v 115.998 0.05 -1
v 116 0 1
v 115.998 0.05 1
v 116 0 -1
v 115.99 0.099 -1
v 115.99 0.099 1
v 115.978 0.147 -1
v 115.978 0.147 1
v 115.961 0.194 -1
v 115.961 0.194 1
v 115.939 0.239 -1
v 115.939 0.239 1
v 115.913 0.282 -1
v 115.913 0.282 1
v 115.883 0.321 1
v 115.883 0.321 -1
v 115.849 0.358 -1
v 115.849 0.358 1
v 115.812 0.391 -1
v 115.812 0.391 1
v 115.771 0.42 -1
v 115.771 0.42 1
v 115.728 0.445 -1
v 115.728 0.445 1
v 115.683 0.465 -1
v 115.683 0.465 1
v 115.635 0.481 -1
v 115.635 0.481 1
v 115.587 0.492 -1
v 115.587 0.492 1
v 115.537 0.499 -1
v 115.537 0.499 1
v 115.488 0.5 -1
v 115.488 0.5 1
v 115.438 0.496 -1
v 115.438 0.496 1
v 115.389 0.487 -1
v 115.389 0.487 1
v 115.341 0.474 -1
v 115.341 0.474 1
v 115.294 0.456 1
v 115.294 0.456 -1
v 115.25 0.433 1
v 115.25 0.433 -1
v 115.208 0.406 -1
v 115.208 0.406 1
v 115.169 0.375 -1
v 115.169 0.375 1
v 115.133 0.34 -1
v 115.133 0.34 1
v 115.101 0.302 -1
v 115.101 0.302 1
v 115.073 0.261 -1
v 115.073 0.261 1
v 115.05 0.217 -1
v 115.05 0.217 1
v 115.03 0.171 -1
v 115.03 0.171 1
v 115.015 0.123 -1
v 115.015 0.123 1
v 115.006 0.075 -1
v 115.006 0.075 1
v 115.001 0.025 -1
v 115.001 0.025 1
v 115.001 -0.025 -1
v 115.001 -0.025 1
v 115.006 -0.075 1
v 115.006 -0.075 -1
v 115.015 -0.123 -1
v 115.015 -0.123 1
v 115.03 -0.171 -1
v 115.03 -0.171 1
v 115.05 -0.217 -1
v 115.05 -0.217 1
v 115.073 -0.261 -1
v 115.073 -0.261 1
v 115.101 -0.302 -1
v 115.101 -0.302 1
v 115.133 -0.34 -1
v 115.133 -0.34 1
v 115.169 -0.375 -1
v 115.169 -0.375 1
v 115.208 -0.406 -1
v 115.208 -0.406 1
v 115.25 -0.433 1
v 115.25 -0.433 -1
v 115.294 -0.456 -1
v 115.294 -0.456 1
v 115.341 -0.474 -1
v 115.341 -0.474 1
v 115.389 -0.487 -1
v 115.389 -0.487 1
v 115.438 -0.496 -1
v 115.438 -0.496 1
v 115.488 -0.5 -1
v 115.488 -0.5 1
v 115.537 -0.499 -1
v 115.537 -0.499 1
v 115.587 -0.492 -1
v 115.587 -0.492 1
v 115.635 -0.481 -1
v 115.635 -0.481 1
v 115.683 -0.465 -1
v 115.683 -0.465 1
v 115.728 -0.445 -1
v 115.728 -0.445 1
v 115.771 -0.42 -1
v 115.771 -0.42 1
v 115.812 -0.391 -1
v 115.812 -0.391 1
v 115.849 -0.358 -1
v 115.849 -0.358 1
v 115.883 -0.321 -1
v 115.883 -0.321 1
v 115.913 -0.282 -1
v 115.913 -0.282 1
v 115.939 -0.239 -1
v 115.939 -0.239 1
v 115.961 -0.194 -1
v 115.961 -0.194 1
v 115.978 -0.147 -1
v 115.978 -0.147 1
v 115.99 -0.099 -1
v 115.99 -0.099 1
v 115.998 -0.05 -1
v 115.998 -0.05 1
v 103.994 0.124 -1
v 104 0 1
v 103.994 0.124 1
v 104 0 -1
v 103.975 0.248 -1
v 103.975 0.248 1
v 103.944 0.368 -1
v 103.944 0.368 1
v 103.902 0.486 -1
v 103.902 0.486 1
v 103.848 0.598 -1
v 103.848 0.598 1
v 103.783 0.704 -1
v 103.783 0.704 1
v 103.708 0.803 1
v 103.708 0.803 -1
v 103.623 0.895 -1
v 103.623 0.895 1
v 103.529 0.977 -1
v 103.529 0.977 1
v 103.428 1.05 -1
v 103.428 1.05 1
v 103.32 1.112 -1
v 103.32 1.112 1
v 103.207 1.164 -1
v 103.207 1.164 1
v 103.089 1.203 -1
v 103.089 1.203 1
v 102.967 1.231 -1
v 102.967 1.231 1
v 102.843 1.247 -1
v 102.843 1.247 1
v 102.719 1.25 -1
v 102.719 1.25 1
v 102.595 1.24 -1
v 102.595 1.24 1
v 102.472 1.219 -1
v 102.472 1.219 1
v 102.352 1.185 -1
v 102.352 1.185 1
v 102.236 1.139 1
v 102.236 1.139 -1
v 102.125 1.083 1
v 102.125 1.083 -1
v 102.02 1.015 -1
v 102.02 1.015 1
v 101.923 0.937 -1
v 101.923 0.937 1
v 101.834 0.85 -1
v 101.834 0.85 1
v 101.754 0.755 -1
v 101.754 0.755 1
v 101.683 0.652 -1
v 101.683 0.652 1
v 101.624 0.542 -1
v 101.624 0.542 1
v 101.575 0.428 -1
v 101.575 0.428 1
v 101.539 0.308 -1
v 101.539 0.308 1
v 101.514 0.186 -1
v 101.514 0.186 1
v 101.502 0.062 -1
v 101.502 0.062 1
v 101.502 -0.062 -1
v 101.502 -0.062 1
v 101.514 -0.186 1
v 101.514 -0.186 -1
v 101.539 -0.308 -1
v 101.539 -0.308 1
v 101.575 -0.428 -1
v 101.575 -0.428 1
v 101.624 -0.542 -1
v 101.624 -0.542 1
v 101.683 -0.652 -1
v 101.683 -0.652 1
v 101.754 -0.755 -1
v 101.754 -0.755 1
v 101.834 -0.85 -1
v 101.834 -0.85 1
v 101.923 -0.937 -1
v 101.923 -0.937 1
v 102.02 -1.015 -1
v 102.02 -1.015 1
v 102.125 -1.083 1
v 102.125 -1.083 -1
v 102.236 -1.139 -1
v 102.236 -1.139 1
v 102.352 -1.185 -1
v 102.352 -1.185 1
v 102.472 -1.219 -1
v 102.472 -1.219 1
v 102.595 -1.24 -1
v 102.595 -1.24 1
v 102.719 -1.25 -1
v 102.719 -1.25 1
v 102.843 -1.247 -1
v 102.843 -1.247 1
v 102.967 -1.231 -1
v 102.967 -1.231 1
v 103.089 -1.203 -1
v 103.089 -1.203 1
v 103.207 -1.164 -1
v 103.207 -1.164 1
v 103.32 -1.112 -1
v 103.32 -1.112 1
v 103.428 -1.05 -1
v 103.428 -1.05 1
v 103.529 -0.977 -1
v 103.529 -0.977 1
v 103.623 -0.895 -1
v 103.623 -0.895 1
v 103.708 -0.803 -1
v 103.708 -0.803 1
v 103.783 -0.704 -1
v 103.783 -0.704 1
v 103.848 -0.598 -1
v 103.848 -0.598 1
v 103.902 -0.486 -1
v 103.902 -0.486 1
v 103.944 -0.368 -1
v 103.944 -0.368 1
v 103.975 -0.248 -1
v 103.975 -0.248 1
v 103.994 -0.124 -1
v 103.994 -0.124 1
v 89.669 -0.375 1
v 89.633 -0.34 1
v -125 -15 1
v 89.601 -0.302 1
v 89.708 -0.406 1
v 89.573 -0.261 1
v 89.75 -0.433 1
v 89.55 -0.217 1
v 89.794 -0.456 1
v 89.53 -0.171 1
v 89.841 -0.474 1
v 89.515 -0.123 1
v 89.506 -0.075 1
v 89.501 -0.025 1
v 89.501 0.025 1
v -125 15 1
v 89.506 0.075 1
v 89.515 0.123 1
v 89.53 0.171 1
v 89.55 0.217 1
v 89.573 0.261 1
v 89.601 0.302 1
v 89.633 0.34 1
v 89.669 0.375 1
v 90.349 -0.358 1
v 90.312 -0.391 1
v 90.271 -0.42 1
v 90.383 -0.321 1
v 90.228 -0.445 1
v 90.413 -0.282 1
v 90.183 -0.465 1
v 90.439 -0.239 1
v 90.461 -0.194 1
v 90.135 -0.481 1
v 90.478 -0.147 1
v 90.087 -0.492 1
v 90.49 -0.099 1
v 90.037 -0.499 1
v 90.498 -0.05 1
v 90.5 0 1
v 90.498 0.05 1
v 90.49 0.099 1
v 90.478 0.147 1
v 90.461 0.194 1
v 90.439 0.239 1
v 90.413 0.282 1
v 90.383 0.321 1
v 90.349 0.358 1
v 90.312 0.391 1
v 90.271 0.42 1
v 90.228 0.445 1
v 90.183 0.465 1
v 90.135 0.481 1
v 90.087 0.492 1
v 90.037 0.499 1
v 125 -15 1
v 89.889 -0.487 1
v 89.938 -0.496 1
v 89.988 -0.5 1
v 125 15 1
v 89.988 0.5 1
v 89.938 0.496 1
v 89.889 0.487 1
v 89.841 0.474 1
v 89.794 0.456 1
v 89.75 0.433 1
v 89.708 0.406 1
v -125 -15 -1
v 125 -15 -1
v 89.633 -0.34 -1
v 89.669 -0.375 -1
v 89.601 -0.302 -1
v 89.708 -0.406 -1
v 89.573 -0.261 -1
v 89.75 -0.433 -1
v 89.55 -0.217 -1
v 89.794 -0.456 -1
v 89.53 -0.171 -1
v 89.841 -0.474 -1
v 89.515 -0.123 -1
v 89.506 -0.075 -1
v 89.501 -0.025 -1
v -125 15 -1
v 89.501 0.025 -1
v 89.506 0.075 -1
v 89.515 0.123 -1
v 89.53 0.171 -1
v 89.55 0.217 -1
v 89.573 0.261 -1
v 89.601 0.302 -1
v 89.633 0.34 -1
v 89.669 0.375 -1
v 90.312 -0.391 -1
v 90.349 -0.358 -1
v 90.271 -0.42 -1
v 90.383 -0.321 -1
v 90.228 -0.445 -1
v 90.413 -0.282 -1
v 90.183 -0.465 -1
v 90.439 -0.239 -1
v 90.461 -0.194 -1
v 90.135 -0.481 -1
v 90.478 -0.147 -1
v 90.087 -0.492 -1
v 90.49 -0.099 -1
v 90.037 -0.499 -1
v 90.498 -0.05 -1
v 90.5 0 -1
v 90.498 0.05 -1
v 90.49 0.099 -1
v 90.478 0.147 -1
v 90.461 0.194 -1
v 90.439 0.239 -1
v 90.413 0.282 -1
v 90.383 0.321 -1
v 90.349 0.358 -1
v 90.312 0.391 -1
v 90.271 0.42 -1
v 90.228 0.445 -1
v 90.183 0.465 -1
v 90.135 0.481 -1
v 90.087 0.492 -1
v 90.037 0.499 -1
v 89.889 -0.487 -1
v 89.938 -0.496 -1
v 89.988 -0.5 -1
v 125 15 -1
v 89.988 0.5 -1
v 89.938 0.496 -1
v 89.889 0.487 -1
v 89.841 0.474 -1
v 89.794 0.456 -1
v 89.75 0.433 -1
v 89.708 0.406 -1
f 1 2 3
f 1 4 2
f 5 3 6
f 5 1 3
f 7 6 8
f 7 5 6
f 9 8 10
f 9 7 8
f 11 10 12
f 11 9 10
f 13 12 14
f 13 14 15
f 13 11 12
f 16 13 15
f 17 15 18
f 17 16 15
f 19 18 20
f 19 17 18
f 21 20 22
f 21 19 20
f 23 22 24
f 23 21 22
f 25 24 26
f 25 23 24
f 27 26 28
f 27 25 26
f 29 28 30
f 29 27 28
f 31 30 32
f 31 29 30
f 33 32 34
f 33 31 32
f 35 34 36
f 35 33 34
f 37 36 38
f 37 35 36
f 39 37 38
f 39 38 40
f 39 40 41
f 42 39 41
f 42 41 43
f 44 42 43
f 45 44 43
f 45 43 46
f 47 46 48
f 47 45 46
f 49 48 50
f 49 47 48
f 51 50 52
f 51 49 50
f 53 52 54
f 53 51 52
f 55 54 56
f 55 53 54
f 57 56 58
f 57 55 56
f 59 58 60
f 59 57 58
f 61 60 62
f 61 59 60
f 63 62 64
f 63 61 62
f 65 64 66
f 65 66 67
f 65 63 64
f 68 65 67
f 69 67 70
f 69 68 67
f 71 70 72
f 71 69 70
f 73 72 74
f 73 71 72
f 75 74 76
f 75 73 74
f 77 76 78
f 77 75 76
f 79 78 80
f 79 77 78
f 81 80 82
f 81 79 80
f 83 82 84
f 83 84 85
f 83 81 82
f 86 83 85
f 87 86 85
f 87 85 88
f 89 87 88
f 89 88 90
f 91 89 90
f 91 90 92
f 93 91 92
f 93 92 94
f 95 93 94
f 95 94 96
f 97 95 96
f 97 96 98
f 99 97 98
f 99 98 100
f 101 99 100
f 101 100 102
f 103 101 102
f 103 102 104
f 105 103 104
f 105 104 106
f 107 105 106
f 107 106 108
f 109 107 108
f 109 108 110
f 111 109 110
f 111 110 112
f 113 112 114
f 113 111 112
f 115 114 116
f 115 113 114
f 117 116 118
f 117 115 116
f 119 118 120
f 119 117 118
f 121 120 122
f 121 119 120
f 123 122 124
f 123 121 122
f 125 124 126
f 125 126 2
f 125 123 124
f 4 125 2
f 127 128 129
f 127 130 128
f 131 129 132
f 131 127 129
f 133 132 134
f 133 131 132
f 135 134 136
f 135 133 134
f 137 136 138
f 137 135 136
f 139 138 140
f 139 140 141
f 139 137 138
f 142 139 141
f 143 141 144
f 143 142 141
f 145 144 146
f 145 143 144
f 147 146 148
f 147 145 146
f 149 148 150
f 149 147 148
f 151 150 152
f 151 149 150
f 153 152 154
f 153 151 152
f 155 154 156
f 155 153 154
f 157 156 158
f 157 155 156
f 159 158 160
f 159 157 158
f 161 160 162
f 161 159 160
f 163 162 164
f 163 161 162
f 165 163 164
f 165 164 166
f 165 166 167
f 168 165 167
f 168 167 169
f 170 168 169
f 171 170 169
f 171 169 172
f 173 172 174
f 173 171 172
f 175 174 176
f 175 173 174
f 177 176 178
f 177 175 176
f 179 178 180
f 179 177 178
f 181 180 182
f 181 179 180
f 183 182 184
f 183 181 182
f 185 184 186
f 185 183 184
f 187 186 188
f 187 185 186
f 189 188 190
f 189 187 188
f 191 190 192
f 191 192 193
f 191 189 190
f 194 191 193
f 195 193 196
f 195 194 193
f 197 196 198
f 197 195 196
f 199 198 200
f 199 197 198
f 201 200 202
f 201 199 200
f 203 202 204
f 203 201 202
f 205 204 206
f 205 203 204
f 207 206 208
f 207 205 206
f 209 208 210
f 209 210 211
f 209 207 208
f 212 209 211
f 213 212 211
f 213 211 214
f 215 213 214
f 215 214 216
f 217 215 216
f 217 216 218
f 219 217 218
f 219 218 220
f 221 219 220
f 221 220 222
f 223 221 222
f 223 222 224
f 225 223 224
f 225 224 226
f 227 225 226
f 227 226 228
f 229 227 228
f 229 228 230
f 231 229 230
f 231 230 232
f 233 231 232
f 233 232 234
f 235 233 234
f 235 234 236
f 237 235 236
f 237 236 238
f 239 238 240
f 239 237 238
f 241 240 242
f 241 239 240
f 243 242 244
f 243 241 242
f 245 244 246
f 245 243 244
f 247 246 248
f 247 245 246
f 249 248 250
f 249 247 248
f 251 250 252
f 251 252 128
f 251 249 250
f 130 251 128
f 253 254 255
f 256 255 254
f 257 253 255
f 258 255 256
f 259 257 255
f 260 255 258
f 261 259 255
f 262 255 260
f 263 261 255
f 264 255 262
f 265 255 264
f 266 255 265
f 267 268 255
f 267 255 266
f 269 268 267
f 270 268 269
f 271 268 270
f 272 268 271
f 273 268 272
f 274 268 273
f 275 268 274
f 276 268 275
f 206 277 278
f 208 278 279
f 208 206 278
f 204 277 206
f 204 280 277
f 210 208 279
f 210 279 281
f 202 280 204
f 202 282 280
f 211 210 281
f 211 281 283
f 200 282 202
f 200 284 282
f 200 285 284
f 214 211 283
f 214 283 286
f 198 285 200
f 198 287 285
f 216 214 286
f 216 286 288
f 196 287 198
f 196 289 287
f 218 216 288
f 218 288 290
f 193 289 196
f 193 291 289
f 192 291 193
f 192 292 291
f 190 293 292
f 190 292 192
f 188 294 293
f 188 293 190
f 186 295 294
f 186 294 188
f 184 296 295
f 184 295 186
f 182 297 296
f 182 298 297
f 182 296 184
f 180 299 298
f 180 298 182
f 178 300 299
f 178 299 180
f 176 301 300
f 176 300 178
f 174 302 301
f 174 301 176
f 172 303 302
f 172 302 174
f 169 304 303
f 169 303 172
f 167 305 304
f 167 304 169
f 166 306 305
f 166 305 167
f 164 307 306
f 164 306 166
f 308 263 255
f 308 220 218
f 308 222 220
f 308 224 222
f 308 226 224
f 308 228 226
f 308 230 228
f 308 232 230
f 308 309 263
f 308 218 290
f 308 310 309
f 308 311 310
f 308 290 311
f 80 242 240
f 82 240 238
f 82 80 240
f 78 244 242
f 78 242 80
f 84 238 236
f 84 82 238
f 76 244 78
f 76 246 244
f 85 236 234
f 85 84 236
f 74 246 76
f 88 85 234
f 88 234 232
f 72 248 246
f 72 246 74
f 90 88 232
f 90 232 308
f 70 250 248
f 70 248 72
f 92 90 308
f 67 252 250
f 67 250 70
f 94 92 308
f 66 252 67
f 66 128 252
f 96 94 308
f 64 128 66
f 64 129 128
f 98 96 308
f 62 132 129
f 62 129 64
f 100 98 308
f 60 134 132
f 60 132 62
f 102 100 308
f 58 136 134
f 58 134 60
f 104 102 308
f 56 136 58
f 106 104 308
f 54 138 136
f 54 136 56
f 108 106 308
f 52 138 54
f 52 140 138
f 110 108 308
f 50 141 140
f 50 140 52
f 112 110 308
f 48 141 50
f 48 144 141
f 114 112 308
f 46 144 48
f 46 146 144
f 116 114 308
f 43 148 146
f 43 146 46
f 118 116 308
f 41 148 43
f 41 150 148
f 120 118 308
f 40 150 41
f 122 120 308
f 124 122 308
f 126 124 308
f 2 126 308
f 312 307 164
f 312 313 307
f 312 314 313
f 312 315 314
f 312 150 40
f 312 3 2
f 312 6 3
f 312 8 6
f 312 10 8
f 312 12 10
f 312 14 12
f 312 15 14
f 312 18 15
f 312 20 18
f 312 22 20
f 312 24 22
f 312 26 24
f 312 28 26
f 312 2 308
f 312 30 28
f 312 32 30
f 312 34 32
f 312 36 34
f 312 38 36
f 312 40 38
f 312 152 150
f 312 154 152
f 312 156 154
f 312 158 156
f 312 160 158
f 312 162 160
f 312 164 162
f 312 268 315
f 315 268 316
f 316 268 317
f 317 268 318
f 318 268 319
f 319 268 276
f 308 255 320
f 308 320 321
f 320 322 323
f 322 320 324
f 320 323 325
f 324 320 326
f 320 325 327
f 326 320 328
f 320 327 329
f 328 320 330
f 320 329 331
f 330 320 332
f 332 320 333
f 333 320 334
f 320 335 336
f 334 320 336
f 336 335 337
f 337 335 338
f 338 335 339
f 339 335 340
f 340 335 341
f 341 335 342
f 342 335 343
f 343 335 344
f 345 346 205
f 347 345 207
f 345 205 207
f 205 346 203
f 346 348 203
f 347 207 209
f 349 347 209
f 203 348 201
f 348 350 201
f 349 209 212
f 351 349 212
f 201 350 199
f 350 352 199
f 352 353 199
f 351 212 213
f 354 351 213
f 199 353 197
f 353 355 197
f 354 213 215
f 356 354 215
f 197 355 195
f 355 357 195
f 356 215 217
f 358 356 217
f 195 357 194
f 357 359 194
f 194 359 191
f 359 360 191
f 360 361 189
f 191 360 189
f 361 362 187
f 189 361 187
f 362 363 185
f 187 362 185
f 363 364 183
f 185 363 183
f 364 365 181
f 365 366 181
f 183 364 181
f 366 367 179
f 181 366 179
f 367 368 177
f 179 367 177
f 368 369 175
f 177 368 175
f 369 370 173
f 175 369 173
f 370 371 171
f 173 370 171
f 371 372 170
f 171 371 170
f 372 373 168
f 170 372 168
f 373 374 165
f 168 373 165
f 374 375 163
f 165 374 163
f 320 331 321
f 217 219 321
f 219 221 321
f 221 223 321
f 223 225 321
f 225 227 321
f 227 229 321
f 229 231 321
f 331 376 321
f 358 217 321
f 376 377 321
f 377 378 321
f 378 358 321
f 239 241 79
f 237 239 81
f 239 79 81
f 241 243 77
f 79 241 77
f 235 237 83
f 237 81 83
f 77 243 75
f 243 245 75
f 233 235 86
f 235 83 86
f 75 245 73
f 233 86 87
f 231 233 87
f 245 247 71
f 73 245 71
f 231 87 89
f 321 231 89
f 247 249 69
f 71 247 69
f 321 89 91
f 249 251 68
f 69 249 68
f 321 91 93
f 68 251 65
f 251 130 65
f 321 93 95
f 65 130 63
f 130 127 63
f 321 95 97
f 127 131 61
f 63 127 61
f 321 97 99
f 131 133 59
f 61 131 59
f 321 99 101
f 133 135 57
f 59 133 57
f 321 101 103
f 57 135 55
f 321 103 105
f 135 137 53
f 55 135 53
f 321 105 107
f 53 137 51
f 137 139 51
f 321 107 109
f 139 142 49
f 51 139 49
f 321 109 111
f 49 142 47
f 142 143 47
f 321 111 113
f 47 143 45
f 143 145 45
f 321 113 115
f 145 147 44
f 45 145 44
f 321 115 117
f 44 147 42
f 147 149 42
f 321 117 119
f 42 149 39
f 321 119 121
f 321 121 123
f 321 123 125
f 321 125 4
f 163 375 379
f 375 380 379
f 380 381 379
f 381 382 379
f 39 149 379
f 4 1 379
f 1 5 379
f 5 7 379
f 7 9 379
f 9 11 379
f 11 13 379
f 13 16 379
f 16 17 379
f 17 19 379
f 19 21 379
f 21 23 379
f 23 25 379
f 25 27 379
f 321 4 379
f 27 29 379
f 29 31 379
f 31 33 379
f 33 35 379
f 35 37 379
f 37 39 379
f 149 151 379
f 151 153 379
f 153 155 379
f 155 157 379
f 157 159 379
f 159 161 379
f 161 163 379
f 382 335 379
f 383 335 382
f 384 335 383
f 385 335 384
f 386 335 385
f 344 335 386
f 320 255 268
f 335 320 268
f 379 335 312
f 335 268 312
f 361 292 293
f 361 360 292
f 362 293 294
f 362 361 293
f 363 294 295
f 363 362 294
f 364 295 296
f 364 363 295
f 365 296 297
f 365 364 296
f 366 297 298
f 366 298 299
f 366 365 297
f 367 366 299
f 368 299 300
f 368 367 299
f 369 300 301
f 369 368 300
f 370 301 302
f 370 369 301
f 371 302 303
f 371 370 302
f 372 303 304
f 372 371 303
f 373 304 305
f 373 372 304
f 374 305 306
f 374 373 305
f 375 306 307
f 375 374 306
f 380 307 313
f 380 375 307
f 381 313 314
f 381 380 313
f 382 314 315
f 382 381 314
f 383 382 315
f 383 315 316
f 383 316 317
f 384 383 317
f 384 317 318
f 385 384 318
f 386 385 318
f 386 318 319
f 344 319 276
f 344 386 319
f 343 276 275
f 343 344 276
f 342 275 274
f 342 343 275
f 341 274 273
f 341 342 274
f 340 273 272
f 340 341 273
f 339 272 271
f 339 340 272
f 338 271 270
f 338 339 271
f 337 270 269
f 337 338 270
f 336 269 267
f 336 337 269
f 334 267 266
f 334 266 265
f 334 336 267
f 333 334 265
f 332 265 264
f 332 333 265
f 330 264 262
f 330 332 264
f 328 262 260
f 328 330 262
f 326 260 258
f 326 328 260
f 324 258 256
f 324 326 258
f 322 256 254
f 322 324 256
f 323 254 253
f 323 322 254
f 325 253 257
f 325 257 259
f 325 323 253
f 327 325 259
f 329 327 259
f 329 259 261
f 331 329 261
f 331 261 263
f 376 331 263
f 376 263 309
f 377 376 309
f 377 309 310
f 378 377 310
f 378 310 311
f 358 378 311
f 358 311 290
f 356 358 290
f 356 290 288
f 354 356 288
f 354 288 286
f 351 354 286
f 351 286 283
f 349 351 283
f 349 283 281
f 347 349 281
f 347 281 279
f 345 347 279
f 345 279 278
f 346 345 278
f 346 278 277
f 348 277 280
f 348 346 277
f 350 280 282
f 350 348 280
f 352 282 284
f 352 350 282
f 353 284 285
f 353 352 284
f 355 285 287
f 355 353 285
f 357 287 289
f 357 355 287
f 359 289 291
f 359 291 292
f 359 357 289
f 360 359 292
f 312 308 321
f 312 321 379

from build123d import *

# Parameters (mm, degrees)
F0_W     = 250
F0_H     = 30
F0_R     = 0.5
F0_R_2   = 1.25
F1_DEPTH = 1


with BuildPart() as f1:
    # F0 (on Top) → F1 (new body, symmetric)
    with BuildSketch(Plane.XY):
        Rectangle(F0_W, F0_H)
        with Locations((90, 0)):
            Circle(F0_R, mode=Mode.SUBTRACT)
        with Locations((102.75, 0)):
            Circle(F0_R_2, mode=Mode.SUBTRACT)
        with Locations((115.5, 0)):
            Circle(F0_R, mode=Mode.SUBTRACT)
    extrude(amount=F1_DEPTH, both=True)


solid = f1.part
